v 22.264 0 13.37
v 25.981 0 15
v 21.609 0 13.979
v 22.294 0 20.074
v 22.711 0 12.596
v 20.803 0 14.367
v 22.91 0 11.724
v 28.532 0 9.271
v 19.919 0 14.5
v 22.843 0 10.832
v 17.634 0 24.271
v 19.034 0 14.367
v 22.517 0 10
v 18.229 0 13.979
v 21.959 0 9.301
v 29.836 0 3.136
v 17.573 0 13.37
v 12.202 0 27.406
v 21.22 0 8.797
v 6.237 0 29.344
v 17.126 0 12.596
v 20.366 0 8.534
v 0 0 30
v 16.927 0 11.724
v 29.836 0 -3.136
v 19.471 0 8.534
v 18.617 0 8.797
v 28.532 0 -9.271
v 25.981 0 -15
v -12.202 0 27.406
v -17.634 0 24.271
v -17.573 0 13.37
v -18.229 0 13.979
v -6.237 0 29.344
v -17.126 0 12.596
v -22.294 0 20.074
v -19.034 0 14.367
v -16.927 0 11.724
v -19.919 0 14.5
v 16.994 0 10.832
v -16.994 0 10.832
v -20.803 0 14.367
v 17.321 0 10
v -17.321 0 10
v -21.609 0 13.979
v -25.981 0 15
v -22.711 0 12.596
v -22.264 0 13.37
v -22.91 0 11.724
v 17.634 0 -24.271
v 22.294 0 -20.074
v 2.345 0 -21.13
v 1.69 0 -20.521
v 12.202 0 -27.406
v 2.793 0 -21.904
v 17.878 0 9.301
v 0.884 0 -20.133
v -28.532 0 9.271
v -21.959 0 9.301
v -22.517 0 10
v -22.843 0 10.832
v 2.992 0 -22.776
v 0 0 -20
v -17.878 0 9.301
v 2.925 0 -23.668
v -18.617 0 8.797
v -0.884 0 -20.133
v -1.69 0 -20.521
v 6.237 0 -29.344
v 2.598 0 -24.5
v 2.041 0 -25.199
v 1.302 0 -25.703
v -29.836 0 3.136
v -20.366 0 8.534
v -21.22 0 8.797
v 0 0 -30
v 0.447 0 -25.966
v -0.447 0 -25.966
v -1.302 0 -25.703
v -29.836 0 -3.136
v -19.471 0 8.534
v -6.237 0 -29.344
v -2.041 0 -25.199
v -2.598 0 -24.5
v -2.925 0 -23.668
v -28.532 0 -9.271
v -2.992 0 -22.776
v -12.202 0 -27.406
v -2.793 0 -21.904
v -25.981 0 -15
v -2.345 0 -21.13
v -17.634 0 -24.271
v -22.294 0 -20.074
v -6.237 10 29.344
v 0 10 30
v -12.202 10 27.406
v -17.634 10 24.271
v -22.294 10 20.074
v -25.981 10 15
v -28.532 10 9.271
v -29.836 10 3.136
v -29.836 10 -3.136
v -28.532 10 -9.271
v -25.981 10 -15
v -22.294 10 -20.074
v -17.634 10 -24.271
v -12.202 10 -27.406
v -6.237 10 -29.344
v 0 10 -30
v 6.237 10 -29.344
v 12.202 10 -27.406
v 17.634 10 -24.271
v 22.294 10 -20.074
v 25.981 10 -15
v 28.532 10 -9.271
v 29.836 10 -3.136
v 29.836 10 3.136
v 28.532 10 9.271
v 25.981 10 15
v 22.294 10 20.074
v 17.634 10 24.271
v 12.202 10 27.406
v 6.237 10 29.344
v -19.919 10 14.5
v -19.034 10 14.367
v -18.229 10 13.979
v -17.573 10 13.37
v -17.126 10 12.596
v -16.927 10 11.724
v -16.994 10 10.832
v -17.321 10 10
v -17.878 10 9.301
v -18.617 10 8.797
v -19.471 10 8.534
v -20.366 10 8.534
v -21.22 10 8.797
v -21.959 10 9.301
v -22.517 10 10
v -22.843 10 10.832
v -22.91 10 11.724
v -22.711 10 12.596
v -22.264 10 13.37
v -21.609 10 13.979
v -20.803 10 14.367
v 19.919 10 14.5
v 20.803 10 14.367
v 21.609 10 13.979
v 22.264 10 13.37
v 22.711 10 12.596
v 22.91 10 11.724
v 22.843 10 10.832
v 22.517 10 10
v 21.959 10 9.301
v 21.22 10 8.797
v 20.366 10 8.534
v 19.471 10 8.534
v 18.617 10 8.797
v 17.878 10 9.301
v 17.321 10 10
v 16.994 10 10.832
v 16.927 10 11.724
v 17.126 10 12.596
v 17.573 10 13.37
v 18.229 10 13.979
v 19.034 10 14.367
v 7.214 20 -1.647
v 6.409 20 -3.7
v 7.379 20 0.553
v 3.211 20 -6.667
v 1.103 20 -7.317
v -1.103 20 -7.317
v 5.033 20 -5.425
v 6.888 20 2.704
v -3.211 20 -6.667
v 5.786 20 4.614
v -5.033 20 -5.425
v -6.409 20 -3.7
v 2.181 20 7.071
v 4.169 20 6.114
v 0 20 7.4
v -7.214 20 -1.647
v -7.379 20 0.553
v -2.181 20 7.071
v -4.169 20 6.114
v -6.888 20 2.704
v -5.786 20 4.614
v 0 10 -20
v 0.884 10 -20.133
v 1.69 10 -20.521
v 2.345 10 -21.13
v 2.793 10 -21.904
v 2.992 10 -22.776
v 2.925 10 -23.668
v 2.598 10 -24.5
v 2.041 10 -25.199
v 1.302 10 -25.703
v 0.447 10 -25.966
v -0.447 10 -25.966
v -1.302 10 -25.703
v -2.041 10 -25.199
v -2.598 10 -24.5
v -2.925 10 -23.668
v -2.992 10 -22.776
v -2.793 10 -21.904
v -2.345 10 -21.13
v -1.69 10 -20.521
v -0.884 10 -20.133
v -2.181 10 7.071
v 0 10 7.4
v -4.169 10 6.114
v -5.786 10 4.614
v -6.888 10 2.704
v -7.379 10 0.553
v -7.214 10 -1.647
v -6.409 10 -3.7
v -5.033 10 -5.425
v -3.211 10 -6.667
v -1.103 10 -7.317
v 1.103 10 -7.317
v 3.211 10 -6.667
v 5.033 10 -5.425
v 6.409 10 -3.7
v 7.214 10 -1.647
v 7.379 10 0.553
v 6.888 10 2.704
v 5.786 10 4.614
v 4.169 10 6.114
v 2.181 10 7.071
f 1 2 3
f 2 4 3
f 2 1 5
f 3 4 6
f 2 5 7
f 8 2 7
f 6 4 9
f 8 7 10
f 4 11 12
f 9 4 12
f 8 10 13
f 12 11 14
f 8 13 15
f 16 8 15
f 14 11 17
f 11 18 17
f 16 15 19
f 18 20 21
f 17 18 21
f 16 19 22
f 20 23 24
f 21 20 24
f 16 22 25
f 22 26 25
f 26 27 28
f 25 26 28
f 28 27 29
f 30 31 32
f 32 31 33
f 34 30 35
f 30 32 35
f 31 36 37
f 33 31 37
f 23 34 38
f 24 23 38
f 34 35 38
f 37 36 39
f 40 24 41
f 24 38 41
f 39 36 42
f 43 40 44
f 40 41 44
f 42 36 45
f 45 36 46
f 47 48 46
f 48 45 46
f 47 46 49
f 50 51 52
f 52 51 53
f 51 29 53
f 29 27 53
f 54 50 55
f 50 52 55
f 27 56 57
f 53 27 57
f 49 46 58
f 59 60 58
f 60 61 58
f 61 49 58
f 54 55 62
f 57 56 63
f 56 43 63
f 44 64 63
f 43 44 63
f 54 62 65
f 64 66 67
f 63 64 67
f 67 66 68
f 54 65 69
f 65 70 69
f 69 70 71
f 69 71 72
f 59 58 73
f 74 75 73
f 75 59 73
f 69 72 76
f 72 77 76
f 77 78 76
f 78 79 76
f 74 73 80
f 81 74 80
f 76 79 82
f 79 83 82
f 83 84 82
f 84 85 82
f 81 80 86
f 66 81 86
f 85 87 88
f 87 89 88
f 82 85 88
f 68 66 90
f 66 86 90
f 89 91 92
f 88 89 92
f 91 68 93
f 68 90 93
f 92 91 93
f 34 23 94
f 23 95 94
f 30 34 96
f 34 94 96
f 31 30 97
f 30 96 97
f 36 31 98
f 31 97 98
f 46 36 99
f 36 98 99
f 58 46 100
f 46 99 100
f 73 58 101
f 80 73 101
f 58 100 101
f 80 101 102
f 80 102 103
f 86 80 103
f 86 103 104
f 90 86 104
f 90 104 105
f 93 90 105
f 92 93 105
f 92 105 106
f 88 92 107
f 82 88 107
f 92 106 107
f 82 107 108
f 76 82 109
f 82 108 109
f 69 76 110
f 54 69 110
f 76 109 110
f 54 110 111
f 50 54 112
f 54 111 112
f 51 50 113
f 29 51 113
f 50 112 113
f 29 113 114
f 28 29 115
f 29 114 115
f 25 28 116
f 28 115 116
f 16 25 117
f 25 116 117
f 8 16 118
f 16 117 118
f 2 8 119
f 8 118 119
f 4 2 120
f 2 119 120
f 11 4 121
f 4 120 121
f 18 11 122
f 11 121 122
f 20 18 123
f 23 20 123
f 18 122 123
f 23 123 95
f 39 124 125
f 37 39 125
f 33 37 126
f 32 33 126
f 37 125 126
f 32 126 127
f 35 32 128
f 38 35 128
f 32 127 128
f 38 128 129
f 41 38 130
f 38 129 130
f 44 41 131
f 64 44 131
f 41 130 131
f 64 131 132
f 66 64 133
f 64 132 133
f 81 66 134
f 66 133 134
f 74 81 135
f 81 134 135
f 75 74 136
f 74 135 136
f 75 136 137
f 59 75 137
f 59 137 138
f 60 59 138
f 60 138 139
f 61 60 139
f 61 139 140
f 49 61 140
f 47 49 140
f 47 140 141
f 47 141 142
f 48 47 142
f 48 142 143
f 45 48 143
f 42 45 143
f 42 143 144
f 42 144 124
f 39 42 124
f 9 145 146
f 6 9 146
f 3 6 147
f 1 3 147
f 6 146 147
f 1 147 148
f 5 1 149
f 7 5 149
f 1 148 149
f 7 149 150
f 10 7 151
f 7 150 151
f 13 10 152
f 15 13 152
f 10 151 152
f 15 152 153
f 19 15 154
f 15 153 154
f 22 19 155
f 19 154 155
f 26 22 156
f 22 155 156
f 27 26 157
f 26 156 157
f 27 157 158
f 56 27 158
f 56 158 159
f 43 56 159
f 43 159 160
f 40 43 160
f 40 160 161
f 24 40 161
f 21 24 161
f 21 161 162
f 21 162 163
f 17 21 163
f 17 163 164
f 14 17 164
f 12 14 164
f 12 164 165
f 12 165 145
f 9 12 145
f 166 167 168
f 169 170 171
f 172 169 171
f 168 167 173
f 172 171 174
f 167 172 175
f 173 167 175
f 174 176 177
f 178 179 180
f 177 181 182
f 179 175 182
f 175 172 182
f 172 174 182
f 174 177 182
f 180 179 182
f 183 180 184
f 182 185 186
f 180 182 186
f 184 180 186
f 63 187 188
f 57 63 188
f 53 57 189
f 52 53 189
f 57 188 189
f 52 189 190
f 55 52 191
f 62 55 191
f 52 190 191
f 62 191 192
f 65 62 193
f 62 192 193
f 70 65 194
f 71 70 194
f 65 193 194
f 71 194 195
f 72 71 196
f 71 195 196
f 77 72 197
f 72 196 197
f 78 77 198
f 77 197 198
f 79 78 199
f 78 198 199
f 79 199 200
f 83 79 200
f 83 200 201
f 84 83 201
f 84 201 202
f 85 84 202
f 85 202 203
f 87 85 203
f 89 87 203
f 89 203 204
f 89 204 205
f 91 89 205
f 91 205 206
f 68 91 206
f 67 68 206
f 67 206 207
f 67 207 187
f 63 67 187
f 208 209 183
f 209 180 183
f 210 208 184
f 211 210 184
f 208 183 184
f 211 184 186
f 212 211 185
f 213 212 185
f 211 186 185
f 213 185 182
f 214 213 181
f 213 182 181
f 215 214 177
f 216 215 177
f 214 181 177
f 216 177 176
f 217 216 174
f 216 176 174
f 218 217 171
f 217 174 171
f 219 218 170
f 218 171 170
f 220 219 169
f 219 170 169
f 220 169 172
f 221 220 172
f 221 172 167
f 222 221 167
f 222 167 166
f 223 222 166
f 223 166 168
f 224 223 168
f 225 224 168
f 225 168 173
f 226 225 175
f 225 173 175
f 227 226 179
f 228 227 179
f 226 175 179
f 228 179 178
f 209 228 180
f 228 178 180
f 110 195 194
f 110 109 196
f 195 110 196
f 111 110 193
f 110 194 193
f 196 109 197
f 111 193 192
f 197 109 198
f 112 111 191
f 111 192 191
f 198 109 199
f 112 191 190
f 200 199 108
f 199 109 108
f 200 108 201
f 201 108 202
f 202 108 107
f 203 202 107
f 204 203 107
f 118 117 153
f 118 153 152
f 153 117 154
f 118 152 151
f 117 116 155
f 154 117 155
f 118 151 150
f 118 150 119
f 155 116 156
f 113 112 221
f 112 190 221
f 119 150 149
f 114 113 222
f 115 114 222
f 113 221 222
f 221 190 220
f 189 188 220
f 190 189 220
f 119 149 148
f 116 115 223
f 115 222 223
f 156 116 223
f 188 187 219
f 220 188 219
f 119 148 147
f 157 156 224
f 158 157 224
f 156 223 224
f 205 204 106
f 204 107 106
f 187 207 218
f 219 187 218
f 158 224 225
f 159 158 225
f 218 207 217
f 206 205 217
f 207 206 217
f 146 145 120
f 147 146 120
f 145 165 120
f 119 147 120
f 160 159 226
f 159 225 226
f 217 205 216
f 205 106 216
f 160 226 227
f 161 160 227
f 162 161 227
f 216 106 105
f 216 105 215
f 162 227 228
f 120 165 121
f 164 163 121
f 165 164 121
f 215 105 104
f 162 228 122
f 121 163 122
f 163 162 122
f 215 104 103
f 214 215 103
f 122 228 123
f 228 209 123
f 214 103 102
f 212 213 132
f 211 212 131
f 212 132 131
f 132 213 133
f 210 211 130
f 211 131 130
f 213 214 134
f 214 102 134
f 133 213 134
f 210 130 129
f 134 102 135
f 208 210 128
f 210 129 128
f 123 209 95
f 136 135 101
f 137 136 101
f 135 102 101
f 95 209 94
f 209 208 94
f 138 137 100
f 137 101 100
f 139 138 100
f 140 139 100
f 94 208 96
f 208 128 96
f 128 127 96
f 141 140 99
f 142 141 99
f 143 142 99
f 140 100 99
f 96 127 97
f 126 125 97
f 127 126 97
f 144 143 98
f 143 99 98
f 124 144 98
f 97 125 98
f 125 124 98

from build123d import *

# Parameters (mm, degrees)
ESQUISSE3_R             = 3
ENL_V_MAT_EXTRU_1_DEPTH = 11


with BuildPart() as part:
    # Esquisse1 → Révolution1 (revolve)
    with BuildSketch(Plane.XY, mode=Mode.PRIVATE) as r_volution1_sk:
        Polygon((0, 0), (30, 0), (30, 10), (7.4, 10), (7.4, 20), (0, 20), align=None)
    revolve(r_volution1_sk.sketch.rotate(Axis((0, 30.251396648, 0), (0, -1, 0)), 90), axis=Axis((0, 30.251396648, 0), (0, -1, 0)))  # turned: the seam where the file's is

    # Esquisse3 → Enlèv. mat.-Extru.1 (cut, through all)
    with BuildSketch(Plane(origin=(0, 10, 0), x_dir=(1, 0, 0), z_dir=(0, 1, 0))):
        with Locations(Location((0, 23, 0), (0, 0, 270))):  # turned: the seam where the file's is
            Circle(ESQUISSE3_R)
        with Locations(Location((19.918584287, -11.5, 0), (0, 0, 270))):  # turned: the seam where the file's is
            Circle(ESQUISSE3_R)
        with Locations(Location((-19.918584287, -11.5, 0), (0, 0, 270))):  # turned: the seam where the file's is
            Circle(ESQUISSE3_R)
    extrude(amount=-ENL_V_MAT_EXTRU_1_DEPTH, mode=Mode.SUBTRACT)


solid = part.part
